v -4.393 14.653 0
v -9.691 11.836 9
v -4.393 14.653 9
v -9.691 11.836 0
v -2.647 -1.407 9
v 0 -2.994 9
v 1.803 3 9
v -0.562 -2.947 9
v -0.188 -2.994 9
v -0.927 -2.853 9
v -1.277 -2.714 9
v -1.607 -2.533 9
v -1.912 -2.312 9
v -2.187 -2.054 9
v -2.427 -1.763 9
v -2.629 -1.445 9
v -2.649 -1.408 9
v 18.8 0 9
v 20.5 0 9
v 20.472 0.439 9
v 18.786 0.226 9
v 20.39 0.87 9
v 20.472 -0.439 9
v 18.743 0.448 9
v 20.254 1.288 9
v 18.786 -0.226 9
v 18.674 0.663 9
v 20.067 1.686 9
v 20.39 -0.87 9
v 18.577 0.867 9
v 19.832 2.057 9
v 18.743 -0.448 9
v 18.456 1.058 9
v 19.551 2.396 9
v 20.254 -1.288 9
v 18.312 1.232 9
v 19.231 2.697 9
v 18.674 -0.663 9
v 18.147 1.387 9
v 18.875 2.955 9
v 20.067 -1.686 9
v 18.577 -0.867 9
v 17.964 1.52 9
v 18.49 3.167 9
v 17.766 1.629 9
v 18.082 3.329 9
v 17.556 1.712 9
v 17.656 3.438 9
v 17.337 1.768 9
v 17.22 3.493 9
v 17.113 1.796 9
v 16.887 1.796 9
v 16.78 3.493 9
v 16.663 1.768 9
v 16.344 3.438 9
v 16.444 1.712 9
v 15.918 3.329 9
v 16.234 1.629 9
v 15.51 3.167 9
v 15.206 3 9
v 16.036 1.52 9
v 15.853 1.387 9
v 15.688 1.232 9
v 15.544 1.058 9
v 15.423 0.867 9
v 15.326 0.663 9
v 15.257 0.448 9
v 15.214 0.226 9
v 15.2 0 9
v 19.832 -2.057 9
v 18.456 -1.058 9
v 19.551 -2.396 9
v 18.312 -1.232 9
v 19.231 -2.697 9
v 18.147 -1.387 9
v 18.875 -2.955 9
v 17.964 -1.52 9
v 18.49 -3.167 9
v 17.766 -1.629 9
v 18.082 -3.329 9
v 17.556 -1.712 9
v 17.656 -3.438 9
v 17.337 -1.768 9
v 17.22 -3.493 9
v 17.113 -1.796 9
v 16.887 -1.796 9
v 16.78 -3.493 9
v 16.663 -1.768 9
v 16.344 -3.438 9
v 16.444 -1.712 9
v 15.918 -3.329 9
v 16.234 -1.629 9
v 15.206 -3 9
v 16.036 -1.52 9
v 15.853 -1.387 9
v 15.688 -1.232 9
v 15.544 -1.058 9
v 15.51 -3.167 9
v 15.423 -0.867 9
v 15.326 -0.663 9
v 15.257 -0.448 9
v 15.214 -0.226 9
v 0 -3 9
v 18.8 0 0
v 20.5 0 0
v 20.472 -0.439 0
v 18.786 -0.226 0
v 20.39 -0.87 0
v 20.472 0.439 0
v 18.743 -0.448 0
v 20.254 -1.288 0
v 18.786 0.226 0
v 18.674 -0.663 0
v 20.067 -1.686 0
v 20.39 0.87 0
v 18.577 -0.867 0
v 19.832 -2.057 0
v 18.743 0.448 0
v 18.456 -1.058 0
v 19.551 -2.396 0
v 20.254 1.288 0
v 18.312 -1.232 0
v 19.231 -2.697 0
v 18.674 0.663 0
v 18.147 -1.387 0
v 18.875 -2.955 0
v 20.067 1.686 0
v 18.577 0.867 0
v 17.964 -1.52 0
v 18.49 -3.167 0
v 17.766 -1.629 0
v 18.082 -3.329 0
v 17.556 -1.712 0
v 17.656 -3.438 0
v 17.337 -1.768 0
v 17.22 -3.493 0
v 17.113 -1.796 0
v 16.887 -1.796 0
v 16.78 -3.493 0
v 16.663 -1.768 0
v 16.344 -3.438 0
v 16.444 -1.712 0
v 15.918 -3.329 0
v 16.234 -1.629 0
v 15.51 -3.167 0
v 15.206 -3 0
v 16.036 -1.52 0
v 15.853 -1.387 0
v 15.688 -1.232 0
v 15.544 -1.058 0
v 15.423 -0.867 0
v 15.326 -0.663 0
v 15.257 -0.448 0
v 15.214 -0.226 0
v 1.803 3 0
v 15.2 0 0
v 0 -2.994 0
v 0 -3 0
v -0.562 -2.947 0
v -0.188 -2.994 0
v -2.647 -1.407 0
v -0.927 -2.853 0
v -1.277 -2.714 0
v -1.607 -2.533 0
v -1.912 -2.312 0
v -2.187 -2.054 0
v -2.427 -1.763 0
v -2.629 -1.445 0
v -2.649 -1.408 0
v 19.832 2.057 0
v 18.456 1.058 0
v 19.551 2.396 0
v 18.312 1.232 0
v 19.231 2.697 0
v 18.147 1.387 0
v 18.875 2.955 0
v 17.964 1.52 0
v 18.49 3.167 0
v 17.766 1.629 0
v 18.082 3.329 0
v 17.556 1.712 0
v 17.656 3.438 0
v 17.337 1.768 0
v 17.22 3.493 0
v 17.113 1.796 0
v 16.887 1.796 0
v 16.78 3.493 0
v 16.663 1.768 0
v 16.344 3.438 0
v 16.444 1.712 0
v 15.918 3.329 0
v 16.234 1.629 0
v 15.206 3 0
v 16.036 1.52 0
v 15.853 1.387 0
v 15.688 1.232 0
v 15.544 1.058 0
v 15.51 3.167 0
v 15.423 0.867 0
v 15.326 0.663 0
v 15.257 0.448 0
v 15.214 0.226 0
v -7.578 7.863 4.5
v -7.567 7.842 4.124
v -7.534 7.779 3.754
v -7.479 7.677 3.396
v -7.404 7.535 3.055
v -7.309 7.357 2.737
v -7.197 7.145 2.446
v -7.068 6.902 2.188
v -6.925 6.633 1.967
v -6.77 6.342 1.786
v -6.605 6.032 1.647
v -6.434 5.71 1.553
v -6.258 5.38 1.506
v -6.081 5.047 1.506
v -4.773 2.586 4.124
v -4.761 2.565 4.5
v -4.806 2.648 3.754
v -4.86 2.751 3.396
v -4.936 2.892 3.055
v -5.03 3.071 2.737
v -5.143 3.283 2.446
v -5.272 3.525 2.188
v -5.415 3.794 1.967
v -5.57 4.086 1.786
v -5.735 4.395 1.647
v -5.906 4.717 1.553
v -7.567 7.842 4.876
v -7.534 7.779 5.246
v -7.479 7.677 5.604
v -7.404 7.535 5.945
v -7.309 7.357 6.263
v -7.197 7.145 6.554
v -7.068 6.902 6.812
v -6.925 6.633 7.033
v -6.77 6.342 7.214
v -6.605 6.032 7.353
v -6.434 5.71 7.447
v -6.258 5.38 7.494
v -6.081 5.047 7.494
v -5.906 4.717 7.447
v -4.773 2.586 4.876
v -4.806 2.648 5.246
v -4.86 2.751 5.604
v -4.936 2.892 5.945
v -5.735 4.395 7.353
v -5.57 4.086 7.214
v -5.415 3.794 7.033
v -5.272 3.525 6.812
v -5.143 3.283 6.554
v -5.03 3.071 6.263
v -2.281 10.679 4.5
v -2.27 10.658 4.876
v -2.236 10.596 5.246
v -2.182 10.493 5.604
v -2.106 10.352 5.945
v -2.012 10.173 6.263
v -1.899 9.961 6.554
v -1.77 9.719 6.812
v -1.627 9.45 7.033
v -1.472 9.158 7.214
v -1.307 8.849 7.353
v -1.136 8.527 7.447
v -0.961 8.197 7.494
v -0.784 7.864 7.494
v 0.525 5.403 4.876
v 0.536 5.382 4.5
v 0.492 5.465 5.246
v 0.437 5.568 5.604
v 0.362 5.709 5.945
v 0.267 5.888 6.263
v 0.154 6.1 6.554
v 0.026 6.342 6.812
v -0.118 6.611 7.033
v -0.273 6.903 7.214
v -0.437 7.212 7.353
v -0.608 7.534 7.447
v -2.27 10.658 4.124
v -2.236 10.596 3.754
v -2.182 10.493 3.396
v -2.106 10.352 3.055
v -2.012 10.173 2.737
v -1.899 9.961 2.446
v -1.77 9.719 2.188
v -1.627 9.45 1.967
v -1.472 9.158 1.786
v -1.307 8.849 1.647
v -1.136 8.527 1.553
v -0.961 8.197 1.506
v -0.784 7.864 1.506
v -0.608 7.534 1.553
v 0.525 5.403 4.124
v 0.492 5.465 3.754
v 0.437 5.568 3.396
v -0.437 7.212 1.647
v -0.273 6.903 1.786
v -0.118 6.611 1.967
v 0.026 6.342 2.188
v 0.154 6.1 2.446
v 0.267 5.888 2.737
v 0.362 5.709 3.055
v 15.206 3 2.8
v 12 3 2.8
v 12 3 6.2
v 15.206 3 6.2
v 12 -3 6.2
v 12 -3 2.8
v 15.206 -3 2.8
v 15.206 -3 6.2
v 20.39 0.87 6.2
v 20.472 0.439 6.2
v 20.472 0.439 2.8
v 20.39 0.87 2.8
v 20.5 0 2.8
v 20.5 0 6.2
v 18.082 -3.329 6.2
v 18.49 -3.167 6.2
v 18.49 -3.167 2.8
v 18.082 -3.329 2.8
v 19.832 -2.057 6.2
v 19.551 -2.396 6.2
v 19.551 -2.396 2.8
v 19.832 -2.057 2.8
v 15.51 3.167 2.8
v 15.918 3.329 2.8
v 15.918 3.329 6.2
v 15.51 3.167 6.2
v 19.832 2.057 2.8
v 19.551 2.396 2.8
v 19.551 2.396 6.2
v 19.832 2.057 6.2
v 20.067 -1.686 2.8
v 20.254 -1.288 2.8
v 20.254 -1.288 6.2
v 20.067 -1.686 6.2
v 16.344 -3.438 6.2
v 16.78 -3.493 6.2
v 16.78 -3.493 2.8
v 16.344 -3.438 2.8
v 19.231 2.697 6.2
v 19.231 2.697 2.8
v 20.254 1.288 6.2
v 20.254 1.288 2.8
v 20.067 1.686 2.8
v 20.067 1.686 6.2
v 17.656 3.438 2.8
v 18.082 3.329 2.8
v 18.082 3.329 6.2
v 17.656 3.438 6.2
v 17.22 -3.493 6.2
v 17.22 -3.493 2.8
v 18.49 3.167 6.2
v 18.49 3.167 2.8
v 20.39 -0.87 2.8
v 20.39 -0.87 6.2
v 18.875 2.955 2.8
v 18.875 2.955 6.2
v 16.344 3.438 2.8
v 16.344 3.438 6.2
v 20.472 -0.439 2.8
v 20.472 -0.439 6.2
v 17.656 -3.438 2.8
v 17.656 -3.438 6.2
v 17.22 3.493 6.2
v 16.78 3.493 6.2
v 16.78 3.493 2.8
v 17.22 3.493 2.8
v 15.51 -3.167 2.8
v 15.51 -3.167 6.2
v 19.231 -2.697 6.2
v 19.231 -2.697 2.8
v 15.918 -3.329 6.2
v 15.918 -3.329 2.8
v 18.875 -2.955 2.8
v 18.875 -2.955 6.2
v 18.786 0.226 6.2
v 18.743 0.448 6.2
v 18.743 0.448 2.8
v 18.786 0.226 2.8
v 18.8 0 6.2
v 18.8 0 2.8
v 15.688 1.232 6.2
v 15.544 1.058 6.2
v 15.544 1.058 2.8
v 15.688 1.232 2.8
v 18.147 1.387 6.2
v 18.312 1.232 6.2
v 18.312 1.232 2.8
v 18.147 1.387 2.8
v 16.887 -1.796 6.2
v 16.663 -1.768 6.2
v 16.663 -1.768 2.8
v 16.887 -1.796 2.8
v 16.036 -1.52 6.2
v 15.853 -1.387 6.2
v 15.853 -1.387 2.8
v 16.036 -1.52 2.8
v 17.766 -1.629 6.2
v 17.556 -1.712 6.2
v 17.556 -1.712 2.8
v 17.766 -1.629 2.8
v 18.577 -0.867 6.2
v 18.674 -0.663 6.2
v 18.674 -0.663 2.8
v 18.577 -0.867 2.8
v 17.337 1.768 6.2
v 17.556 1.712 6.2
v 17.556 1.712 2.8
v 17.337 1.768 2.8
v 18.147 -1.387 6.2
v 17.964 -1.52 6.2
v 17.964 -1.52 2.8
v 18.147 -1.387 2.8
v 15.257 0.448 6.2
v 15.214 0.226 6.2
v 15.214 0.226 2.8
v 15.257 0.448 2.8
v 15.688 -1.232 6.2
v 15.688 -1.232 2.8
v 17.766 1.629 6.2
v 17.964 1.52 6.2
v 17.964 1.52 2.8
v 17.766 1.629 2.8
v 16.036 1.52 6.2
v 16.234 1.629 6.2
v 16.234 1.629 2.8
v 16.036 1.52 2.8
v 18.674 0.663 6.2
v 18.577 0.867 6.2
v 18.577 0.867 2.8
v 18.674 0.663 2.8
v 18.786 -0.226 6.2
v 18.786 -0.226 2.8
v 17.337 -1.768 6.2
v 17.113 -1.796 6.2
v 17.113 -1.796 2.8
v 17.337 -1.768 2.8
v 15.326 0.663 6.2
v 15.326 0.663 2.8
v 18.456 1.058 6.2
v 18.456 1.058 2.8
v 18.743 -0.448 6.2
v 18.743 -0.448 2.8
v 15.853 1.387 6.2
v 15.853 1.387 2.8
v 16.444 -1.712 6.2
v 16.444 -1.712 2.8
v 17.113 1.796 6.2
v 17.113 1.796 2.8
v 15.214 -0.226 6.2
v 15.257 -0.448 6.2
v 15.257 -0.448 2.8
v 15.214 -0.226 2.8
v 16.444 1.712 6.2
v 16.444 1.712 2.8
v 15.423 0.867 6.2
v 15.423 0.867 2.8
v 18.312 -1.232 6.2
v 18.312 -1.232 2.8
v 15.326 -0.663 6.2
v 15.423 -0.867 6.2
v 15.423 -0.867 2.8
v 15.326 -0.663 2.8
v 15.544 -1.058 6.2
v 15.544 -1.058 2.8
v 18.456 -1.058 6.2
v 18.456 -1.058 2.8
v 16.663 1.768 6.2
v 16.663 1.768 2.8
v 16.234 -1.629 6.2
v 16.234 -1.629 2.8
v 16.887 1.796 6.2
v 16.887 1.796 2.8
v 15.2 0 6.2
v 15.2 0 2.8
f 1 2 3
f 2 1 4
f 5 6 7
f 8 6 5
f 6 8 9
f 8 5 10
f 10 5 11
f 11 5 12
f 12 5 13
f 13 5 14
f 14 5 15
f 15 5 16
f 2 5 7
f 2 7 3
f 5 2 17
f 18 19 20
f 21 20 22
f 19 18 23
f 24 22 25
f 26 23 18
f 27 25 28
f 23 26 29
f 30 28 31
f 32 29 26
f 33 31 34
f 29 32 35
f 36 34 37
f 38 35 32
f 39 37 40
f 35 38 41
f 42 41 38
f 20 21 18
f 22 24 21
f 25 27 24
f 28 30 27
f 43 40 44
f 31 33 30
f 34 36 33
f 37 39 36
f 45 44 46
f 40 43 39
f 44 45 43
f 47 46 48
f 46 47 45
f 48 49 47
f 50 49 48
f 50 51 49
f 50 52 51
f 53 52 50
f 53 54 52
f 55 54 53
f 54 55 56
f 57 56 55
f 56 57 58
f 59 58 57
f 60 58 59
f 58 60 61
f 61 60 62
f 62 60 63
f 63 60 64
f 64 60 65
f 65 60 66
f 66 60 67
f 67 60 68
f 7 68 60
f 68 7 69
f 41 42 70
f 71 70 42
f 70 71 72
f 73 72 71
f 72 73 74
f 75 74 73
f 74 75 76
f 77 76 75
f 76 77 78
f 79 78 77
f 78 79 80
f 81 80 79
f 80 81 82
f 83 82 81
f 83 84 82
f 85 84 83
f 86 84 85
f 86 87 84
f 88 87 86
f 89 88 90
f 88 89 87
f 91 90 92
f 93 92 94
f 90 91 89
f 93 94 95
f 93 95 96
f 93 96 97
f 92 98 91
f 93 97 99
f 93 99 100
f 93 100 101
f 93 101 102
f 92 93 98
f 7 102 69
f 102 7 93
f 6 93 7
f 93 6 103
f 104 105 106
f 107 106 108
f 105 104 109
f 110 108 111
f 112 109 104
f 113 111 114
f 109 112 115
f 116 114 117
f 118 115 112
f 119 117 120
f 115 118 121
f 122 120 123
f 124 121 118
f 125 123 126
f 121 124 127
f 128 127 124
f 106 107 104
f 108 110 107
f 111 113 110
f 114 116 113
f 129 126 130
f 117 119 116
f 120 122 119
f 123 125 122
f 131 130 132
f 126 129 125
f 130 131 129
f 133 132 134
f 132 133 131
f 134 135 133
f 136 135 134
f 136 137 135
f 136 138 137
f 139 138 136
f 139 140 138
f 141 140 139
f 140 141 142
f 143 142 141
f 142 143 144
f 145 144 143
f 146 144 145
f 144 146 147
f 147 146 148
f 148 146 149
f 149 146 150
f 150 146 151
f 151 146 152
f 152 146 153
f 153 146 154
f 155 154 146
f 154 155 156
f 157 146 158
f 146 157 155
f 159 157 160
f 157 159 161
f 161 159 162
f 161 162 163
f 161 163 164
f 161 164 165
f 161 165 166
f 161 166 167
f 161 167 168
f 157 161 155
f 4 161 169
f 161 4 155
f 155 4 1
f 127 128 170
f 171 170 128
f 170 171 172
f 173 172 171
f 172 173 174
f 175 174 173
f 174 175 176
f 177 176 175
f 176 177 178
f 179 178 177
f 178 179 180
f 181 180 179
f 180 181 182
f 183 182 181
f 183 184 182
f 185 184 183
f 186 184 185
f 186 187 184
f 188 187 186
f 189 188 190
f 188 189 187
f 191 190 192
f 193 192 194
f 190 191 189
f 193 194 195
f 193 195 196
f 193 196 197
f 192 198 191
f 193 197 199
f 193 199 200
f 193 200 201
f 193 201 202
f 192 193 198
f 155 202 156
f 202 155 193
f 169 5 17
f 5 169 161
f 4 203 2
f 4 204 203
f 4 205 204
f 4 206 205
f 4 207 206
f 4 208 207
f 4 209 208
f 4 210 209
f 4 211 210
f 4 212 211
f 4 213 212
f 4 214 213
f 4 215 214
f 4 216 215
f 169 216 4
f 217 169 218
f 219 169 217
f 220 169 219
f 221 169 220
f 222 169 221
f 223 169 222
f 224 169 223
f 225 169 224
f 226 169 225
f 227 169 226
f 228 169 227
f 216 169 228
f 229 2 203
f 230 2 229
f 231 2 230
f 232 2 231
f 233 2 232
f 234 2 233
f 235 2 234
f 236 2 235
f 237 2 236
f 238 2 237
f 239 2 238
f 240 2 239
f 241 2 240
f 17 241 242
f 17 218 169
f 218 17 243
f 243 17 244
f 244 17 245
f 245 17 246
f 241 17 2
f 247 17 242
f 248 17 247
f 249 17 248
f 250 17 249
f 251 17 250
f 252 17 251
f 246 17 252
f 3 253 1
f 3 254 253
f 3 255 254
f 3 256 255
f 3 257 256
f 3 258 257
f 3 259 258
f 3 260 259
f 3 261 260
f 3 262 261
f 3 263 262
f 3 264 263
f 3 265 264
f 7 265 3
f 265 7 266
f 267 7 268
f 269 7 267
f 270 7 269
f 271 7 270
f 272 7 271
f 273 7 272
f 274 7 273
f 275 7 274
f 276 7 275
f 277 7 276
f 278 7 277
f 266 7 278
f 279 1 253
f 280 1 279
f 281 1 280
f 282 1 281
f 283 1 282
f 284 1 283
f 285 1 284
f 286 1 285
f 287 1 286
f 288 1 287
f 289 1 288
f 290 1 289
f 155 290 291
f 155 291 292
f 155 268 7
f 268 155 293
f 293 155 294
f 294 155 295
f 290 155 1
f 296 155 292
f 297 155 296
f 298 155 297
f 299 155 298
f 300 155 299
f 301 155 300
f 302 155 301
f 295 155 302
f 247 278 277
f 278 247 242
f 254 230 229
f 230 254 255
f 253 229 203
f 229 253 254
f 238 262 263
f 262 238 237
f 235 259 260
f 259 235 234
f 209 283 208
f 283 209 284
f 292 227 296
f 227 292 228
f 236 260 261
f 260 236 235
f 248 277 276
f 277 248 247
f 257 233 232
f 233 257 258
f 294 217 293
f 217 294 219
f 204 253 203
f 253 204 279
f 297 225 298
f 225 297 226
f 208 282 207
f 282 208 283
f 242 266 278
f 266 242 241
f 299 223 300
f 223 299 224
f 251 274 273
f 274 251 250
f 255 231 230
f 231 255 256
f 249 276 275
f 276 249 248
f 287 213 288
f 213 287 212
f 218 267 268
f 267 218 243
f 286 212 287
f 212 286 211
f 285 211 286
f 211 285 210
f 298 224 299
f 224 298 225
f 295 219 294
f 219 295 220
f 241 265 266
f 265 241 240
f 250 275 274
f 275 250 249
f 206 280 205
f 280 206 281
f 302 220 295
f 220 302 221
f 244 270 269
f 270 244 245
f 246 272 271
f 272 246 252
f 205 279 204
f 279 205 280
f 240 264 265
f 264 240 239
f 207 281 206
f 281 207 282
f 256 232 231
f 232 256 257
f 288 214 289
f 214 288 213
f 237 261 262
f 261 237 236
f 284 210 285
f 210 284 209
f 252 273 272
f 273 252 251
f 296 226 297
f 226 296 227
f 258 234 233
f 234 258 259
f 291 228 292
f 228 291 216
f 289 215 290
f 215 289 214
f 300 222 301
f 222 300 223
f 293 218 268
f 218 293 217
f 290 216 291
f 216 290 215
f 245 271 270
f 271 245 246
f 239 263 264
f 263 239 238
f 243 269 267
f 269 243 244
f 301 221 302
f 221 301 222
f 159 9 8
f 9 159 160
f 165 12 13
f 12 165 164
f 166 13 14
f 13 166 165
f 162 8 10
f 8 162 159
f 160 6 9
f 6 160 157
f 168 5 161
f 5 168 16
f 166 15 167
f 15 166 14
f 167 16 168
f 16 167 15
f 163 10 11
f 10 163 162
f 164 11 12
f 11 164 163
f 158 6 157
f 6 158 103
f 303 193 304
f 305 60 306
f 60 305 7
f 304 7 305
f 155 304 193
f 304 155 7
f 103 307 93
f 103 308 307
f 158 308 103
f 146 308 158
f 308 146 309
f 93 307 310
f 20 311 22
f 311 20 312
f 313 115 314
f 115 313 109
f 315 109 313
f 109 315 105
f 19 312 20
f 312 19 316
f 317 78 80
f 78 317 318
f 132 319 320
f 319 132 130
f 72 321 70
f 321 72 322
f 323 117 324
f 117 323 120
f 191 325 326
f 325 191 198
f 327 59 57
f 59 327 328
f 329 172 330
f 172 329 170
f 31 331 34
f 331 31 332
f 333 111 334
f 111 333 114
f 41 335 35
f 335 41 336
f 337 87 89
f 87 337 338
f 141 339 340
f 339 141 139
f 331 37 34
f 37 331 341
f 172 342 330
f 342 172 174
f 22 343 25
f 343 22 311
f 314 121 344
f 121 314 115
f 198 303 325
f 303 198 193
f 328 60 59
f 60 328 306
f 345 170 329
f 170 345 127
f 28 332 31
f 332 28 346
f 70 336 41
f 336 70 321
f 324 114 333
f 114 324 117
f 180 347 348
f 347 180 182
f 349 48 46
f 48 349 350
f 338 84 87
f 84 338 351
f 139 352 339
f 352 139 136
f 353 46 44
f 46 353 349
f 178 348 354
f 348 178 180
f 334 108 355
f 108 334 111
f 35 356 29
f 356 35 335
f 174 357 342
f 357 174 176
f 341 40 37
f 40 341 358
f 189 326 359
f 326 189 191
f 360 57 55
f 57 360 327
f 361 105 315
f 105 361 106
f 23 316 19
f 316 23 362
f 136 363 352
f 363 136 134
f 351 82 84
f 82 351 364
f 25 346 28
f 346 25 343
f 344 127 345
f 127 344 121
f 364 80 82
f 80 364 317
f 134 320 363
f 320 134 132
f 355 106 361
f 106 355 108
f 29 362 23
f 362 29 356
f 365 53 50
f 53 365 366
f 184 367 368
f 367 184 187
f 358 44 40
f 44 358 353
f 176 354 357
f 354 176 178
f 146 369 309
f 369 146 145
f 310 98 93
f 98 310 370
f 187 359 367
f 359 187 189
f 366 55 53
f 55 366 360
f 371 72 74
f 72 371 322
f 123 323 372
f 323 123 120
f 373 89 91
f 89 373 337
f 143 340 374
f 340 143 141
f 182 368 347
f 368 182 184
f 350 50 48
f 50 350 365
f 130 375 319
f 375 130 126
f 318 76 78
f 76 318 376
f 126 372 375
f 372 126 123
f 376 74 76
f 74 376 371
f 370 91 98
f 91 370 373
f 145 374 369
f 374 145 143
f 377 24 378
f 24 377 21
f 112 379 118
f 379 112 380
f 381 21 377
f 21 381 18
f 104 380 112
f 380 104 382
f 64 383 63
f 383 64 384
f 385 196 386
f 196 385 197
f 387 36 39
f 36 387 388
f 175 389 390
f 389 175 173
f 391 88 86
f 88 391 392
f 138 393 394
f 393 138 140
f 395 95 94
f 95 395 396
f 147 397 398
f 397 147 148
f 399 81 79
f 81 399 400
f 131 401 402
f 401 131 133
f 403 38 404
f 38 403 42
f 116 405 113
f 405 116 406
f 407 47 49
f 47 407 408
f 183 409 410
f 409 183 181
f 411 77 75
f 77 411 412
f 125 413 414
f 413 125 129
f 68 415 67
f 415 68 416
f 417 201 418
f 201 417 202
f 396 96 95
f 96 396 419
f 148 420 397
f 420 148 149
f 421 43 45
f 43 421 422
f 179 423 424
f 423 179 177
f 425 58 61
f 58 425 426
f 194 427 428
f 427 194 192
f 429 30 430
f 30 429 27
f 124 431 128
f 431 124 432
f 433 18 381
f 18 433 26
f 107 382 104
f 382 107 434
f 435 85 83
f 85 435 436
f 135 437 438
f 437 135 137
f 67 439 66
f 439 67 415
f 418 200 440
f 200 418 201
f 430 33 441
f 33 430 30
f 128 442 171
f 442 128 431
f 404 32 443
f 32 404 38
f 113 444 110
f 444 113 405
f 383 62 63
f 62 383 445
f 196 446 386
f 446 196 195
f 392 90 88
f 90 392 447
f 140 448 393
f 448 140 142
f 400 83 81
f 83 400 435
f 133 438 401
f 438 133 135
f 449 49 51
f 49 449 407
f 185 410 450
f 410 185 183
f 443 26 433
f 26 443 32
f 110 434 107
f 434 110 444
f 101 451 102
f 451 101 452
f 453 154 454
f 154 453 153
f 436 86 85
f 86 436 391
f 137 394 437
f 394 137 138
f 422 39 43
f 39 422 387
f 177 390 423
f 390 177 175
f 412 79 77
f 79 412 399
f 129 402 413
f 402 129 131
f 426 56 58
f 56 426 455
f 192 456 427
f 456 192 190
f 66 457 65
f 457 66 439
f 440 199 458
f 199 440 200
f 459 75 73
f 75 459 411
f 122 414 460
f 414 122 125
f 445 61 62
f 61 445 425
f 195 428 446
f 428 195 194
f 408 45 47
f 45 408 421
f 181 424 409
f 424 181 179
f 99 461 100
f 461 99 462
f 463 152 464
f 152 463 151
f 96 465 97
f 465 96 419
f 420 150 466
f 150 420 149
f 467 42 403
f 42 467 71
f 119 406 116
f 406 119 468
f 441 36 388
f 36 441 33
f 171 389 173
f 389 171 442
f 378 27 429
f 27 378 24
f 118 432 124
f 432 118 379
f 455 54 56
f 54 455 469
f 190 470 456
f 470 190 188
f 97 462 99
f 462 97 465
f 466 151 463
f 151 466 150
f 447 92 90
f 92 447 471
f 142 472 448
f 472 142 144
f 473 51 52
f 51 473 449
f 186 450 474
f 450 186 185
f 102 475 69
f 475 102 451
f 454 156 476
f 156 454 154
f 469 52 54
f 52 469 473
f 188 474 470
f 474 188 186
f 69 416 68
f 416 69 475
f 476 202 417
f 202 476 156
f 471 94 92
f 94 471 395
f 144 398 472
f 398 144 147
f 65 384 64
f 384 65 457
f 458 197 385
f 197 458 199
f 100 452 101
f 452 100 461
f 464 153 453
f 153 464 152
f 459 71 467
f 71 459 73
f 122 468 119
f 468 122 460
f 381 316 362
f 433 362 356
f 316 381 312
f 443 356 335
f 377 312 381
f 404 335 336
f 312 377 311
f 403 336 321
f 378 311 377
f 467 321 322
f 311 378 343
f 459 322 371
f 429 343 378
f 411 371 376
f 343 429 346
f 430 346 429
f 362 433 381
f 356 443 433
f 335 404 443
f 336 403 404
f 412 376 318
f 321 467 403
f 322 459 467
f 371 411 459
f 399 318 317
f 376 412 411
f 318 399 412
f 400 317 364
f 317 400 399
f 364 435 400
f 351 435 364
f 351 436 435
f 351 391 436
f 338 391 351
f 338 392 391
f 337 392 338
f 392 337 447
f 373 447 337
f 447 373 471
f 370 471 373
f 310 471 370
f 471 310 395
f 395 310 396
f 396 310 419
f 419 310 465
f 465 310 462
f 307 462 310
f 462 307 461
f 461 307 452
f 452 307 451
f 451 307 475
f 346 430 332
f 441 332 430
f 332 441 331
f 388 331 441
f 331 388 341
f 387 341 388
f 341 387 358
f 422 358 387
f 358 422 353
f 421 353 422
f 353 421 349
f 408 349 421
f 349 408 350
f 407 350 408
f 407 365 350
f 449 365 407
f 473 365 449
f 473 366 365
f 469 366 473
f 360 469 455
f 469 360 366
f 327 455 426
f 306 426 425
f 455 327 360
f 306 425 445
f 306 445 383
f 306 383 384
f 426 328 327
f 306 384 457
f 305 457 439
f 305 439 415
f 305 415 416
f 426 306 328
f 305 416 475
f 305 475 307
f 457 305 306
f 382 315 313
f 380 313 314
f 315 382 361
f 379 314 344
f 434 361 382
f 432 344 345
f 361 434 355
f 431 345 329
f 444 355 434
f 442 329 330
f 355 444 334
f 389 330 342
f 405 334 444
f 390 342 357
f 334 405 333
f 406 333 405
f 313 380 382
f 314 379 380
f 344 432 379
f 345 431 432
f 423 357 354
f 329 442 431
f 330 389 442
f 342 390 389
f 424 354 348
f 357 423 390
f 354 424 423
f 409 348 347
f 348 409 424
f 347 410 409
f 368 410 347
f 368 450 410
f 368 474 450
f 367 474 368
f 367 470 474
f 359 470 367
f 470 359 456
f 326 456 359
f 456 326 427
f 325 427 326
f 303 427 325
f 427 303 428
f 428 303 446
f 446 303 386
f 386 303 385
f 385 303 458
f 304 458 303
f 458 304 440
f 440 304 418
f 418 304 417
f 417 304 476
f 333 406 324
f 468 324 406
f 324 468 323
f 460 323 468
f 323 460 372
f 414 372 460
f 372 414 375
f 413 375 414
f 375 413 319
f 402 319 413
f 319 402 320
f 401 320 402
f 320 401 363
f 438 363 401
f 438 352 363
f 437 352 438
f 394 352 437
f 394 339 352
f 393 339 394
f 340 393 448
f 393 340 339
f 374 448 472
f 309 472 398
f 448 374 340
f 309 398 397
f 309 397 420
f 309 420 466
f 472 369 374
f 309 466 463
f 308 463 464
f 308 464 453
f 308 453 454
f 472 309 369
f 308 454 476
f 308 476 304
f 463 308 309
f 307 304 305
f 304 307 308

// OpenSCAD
height = 7 + 2;
length = 17;
angle = 180 - 62;
thick = 6;

difference(){
    union(){
        rotate( angle, [ 0, 0, 1 ] ) {
            difference(){
                translate( [ 0, - thick / 2, 0 ] )
                    cube( [ 15, thick, height ] );
                translate( [ 15 / 2, thick / 2 + 0.1, height / 2 ] )
                    rotate( 90, [ 1, 0, 0 ] )
                        cylinder( h = thick + 0.2, r = 4 / 2 + 1, $fn = 50 );
            }
        }
        cylinder( h = height, r = thick / 2, $fn = 50 );
    
        translate( [ 0, -thick / 2, 0 ] )
            cube( [ length, thick, height ] );
    
        translate( [ length, 0, 0 ] )
            cylinder( h = height, r = 3.5, $fn = 50 );
    }
    
    translate( [ length, 0, -1 ] )
        cylinder( h = height + 2, r = 1.8, $fn = 50 );
    translate( [ length - 5, -5, ( height - 3.4 ) / 2 ] )
        cube( [ 10, 10, 3.4 ] );
}
